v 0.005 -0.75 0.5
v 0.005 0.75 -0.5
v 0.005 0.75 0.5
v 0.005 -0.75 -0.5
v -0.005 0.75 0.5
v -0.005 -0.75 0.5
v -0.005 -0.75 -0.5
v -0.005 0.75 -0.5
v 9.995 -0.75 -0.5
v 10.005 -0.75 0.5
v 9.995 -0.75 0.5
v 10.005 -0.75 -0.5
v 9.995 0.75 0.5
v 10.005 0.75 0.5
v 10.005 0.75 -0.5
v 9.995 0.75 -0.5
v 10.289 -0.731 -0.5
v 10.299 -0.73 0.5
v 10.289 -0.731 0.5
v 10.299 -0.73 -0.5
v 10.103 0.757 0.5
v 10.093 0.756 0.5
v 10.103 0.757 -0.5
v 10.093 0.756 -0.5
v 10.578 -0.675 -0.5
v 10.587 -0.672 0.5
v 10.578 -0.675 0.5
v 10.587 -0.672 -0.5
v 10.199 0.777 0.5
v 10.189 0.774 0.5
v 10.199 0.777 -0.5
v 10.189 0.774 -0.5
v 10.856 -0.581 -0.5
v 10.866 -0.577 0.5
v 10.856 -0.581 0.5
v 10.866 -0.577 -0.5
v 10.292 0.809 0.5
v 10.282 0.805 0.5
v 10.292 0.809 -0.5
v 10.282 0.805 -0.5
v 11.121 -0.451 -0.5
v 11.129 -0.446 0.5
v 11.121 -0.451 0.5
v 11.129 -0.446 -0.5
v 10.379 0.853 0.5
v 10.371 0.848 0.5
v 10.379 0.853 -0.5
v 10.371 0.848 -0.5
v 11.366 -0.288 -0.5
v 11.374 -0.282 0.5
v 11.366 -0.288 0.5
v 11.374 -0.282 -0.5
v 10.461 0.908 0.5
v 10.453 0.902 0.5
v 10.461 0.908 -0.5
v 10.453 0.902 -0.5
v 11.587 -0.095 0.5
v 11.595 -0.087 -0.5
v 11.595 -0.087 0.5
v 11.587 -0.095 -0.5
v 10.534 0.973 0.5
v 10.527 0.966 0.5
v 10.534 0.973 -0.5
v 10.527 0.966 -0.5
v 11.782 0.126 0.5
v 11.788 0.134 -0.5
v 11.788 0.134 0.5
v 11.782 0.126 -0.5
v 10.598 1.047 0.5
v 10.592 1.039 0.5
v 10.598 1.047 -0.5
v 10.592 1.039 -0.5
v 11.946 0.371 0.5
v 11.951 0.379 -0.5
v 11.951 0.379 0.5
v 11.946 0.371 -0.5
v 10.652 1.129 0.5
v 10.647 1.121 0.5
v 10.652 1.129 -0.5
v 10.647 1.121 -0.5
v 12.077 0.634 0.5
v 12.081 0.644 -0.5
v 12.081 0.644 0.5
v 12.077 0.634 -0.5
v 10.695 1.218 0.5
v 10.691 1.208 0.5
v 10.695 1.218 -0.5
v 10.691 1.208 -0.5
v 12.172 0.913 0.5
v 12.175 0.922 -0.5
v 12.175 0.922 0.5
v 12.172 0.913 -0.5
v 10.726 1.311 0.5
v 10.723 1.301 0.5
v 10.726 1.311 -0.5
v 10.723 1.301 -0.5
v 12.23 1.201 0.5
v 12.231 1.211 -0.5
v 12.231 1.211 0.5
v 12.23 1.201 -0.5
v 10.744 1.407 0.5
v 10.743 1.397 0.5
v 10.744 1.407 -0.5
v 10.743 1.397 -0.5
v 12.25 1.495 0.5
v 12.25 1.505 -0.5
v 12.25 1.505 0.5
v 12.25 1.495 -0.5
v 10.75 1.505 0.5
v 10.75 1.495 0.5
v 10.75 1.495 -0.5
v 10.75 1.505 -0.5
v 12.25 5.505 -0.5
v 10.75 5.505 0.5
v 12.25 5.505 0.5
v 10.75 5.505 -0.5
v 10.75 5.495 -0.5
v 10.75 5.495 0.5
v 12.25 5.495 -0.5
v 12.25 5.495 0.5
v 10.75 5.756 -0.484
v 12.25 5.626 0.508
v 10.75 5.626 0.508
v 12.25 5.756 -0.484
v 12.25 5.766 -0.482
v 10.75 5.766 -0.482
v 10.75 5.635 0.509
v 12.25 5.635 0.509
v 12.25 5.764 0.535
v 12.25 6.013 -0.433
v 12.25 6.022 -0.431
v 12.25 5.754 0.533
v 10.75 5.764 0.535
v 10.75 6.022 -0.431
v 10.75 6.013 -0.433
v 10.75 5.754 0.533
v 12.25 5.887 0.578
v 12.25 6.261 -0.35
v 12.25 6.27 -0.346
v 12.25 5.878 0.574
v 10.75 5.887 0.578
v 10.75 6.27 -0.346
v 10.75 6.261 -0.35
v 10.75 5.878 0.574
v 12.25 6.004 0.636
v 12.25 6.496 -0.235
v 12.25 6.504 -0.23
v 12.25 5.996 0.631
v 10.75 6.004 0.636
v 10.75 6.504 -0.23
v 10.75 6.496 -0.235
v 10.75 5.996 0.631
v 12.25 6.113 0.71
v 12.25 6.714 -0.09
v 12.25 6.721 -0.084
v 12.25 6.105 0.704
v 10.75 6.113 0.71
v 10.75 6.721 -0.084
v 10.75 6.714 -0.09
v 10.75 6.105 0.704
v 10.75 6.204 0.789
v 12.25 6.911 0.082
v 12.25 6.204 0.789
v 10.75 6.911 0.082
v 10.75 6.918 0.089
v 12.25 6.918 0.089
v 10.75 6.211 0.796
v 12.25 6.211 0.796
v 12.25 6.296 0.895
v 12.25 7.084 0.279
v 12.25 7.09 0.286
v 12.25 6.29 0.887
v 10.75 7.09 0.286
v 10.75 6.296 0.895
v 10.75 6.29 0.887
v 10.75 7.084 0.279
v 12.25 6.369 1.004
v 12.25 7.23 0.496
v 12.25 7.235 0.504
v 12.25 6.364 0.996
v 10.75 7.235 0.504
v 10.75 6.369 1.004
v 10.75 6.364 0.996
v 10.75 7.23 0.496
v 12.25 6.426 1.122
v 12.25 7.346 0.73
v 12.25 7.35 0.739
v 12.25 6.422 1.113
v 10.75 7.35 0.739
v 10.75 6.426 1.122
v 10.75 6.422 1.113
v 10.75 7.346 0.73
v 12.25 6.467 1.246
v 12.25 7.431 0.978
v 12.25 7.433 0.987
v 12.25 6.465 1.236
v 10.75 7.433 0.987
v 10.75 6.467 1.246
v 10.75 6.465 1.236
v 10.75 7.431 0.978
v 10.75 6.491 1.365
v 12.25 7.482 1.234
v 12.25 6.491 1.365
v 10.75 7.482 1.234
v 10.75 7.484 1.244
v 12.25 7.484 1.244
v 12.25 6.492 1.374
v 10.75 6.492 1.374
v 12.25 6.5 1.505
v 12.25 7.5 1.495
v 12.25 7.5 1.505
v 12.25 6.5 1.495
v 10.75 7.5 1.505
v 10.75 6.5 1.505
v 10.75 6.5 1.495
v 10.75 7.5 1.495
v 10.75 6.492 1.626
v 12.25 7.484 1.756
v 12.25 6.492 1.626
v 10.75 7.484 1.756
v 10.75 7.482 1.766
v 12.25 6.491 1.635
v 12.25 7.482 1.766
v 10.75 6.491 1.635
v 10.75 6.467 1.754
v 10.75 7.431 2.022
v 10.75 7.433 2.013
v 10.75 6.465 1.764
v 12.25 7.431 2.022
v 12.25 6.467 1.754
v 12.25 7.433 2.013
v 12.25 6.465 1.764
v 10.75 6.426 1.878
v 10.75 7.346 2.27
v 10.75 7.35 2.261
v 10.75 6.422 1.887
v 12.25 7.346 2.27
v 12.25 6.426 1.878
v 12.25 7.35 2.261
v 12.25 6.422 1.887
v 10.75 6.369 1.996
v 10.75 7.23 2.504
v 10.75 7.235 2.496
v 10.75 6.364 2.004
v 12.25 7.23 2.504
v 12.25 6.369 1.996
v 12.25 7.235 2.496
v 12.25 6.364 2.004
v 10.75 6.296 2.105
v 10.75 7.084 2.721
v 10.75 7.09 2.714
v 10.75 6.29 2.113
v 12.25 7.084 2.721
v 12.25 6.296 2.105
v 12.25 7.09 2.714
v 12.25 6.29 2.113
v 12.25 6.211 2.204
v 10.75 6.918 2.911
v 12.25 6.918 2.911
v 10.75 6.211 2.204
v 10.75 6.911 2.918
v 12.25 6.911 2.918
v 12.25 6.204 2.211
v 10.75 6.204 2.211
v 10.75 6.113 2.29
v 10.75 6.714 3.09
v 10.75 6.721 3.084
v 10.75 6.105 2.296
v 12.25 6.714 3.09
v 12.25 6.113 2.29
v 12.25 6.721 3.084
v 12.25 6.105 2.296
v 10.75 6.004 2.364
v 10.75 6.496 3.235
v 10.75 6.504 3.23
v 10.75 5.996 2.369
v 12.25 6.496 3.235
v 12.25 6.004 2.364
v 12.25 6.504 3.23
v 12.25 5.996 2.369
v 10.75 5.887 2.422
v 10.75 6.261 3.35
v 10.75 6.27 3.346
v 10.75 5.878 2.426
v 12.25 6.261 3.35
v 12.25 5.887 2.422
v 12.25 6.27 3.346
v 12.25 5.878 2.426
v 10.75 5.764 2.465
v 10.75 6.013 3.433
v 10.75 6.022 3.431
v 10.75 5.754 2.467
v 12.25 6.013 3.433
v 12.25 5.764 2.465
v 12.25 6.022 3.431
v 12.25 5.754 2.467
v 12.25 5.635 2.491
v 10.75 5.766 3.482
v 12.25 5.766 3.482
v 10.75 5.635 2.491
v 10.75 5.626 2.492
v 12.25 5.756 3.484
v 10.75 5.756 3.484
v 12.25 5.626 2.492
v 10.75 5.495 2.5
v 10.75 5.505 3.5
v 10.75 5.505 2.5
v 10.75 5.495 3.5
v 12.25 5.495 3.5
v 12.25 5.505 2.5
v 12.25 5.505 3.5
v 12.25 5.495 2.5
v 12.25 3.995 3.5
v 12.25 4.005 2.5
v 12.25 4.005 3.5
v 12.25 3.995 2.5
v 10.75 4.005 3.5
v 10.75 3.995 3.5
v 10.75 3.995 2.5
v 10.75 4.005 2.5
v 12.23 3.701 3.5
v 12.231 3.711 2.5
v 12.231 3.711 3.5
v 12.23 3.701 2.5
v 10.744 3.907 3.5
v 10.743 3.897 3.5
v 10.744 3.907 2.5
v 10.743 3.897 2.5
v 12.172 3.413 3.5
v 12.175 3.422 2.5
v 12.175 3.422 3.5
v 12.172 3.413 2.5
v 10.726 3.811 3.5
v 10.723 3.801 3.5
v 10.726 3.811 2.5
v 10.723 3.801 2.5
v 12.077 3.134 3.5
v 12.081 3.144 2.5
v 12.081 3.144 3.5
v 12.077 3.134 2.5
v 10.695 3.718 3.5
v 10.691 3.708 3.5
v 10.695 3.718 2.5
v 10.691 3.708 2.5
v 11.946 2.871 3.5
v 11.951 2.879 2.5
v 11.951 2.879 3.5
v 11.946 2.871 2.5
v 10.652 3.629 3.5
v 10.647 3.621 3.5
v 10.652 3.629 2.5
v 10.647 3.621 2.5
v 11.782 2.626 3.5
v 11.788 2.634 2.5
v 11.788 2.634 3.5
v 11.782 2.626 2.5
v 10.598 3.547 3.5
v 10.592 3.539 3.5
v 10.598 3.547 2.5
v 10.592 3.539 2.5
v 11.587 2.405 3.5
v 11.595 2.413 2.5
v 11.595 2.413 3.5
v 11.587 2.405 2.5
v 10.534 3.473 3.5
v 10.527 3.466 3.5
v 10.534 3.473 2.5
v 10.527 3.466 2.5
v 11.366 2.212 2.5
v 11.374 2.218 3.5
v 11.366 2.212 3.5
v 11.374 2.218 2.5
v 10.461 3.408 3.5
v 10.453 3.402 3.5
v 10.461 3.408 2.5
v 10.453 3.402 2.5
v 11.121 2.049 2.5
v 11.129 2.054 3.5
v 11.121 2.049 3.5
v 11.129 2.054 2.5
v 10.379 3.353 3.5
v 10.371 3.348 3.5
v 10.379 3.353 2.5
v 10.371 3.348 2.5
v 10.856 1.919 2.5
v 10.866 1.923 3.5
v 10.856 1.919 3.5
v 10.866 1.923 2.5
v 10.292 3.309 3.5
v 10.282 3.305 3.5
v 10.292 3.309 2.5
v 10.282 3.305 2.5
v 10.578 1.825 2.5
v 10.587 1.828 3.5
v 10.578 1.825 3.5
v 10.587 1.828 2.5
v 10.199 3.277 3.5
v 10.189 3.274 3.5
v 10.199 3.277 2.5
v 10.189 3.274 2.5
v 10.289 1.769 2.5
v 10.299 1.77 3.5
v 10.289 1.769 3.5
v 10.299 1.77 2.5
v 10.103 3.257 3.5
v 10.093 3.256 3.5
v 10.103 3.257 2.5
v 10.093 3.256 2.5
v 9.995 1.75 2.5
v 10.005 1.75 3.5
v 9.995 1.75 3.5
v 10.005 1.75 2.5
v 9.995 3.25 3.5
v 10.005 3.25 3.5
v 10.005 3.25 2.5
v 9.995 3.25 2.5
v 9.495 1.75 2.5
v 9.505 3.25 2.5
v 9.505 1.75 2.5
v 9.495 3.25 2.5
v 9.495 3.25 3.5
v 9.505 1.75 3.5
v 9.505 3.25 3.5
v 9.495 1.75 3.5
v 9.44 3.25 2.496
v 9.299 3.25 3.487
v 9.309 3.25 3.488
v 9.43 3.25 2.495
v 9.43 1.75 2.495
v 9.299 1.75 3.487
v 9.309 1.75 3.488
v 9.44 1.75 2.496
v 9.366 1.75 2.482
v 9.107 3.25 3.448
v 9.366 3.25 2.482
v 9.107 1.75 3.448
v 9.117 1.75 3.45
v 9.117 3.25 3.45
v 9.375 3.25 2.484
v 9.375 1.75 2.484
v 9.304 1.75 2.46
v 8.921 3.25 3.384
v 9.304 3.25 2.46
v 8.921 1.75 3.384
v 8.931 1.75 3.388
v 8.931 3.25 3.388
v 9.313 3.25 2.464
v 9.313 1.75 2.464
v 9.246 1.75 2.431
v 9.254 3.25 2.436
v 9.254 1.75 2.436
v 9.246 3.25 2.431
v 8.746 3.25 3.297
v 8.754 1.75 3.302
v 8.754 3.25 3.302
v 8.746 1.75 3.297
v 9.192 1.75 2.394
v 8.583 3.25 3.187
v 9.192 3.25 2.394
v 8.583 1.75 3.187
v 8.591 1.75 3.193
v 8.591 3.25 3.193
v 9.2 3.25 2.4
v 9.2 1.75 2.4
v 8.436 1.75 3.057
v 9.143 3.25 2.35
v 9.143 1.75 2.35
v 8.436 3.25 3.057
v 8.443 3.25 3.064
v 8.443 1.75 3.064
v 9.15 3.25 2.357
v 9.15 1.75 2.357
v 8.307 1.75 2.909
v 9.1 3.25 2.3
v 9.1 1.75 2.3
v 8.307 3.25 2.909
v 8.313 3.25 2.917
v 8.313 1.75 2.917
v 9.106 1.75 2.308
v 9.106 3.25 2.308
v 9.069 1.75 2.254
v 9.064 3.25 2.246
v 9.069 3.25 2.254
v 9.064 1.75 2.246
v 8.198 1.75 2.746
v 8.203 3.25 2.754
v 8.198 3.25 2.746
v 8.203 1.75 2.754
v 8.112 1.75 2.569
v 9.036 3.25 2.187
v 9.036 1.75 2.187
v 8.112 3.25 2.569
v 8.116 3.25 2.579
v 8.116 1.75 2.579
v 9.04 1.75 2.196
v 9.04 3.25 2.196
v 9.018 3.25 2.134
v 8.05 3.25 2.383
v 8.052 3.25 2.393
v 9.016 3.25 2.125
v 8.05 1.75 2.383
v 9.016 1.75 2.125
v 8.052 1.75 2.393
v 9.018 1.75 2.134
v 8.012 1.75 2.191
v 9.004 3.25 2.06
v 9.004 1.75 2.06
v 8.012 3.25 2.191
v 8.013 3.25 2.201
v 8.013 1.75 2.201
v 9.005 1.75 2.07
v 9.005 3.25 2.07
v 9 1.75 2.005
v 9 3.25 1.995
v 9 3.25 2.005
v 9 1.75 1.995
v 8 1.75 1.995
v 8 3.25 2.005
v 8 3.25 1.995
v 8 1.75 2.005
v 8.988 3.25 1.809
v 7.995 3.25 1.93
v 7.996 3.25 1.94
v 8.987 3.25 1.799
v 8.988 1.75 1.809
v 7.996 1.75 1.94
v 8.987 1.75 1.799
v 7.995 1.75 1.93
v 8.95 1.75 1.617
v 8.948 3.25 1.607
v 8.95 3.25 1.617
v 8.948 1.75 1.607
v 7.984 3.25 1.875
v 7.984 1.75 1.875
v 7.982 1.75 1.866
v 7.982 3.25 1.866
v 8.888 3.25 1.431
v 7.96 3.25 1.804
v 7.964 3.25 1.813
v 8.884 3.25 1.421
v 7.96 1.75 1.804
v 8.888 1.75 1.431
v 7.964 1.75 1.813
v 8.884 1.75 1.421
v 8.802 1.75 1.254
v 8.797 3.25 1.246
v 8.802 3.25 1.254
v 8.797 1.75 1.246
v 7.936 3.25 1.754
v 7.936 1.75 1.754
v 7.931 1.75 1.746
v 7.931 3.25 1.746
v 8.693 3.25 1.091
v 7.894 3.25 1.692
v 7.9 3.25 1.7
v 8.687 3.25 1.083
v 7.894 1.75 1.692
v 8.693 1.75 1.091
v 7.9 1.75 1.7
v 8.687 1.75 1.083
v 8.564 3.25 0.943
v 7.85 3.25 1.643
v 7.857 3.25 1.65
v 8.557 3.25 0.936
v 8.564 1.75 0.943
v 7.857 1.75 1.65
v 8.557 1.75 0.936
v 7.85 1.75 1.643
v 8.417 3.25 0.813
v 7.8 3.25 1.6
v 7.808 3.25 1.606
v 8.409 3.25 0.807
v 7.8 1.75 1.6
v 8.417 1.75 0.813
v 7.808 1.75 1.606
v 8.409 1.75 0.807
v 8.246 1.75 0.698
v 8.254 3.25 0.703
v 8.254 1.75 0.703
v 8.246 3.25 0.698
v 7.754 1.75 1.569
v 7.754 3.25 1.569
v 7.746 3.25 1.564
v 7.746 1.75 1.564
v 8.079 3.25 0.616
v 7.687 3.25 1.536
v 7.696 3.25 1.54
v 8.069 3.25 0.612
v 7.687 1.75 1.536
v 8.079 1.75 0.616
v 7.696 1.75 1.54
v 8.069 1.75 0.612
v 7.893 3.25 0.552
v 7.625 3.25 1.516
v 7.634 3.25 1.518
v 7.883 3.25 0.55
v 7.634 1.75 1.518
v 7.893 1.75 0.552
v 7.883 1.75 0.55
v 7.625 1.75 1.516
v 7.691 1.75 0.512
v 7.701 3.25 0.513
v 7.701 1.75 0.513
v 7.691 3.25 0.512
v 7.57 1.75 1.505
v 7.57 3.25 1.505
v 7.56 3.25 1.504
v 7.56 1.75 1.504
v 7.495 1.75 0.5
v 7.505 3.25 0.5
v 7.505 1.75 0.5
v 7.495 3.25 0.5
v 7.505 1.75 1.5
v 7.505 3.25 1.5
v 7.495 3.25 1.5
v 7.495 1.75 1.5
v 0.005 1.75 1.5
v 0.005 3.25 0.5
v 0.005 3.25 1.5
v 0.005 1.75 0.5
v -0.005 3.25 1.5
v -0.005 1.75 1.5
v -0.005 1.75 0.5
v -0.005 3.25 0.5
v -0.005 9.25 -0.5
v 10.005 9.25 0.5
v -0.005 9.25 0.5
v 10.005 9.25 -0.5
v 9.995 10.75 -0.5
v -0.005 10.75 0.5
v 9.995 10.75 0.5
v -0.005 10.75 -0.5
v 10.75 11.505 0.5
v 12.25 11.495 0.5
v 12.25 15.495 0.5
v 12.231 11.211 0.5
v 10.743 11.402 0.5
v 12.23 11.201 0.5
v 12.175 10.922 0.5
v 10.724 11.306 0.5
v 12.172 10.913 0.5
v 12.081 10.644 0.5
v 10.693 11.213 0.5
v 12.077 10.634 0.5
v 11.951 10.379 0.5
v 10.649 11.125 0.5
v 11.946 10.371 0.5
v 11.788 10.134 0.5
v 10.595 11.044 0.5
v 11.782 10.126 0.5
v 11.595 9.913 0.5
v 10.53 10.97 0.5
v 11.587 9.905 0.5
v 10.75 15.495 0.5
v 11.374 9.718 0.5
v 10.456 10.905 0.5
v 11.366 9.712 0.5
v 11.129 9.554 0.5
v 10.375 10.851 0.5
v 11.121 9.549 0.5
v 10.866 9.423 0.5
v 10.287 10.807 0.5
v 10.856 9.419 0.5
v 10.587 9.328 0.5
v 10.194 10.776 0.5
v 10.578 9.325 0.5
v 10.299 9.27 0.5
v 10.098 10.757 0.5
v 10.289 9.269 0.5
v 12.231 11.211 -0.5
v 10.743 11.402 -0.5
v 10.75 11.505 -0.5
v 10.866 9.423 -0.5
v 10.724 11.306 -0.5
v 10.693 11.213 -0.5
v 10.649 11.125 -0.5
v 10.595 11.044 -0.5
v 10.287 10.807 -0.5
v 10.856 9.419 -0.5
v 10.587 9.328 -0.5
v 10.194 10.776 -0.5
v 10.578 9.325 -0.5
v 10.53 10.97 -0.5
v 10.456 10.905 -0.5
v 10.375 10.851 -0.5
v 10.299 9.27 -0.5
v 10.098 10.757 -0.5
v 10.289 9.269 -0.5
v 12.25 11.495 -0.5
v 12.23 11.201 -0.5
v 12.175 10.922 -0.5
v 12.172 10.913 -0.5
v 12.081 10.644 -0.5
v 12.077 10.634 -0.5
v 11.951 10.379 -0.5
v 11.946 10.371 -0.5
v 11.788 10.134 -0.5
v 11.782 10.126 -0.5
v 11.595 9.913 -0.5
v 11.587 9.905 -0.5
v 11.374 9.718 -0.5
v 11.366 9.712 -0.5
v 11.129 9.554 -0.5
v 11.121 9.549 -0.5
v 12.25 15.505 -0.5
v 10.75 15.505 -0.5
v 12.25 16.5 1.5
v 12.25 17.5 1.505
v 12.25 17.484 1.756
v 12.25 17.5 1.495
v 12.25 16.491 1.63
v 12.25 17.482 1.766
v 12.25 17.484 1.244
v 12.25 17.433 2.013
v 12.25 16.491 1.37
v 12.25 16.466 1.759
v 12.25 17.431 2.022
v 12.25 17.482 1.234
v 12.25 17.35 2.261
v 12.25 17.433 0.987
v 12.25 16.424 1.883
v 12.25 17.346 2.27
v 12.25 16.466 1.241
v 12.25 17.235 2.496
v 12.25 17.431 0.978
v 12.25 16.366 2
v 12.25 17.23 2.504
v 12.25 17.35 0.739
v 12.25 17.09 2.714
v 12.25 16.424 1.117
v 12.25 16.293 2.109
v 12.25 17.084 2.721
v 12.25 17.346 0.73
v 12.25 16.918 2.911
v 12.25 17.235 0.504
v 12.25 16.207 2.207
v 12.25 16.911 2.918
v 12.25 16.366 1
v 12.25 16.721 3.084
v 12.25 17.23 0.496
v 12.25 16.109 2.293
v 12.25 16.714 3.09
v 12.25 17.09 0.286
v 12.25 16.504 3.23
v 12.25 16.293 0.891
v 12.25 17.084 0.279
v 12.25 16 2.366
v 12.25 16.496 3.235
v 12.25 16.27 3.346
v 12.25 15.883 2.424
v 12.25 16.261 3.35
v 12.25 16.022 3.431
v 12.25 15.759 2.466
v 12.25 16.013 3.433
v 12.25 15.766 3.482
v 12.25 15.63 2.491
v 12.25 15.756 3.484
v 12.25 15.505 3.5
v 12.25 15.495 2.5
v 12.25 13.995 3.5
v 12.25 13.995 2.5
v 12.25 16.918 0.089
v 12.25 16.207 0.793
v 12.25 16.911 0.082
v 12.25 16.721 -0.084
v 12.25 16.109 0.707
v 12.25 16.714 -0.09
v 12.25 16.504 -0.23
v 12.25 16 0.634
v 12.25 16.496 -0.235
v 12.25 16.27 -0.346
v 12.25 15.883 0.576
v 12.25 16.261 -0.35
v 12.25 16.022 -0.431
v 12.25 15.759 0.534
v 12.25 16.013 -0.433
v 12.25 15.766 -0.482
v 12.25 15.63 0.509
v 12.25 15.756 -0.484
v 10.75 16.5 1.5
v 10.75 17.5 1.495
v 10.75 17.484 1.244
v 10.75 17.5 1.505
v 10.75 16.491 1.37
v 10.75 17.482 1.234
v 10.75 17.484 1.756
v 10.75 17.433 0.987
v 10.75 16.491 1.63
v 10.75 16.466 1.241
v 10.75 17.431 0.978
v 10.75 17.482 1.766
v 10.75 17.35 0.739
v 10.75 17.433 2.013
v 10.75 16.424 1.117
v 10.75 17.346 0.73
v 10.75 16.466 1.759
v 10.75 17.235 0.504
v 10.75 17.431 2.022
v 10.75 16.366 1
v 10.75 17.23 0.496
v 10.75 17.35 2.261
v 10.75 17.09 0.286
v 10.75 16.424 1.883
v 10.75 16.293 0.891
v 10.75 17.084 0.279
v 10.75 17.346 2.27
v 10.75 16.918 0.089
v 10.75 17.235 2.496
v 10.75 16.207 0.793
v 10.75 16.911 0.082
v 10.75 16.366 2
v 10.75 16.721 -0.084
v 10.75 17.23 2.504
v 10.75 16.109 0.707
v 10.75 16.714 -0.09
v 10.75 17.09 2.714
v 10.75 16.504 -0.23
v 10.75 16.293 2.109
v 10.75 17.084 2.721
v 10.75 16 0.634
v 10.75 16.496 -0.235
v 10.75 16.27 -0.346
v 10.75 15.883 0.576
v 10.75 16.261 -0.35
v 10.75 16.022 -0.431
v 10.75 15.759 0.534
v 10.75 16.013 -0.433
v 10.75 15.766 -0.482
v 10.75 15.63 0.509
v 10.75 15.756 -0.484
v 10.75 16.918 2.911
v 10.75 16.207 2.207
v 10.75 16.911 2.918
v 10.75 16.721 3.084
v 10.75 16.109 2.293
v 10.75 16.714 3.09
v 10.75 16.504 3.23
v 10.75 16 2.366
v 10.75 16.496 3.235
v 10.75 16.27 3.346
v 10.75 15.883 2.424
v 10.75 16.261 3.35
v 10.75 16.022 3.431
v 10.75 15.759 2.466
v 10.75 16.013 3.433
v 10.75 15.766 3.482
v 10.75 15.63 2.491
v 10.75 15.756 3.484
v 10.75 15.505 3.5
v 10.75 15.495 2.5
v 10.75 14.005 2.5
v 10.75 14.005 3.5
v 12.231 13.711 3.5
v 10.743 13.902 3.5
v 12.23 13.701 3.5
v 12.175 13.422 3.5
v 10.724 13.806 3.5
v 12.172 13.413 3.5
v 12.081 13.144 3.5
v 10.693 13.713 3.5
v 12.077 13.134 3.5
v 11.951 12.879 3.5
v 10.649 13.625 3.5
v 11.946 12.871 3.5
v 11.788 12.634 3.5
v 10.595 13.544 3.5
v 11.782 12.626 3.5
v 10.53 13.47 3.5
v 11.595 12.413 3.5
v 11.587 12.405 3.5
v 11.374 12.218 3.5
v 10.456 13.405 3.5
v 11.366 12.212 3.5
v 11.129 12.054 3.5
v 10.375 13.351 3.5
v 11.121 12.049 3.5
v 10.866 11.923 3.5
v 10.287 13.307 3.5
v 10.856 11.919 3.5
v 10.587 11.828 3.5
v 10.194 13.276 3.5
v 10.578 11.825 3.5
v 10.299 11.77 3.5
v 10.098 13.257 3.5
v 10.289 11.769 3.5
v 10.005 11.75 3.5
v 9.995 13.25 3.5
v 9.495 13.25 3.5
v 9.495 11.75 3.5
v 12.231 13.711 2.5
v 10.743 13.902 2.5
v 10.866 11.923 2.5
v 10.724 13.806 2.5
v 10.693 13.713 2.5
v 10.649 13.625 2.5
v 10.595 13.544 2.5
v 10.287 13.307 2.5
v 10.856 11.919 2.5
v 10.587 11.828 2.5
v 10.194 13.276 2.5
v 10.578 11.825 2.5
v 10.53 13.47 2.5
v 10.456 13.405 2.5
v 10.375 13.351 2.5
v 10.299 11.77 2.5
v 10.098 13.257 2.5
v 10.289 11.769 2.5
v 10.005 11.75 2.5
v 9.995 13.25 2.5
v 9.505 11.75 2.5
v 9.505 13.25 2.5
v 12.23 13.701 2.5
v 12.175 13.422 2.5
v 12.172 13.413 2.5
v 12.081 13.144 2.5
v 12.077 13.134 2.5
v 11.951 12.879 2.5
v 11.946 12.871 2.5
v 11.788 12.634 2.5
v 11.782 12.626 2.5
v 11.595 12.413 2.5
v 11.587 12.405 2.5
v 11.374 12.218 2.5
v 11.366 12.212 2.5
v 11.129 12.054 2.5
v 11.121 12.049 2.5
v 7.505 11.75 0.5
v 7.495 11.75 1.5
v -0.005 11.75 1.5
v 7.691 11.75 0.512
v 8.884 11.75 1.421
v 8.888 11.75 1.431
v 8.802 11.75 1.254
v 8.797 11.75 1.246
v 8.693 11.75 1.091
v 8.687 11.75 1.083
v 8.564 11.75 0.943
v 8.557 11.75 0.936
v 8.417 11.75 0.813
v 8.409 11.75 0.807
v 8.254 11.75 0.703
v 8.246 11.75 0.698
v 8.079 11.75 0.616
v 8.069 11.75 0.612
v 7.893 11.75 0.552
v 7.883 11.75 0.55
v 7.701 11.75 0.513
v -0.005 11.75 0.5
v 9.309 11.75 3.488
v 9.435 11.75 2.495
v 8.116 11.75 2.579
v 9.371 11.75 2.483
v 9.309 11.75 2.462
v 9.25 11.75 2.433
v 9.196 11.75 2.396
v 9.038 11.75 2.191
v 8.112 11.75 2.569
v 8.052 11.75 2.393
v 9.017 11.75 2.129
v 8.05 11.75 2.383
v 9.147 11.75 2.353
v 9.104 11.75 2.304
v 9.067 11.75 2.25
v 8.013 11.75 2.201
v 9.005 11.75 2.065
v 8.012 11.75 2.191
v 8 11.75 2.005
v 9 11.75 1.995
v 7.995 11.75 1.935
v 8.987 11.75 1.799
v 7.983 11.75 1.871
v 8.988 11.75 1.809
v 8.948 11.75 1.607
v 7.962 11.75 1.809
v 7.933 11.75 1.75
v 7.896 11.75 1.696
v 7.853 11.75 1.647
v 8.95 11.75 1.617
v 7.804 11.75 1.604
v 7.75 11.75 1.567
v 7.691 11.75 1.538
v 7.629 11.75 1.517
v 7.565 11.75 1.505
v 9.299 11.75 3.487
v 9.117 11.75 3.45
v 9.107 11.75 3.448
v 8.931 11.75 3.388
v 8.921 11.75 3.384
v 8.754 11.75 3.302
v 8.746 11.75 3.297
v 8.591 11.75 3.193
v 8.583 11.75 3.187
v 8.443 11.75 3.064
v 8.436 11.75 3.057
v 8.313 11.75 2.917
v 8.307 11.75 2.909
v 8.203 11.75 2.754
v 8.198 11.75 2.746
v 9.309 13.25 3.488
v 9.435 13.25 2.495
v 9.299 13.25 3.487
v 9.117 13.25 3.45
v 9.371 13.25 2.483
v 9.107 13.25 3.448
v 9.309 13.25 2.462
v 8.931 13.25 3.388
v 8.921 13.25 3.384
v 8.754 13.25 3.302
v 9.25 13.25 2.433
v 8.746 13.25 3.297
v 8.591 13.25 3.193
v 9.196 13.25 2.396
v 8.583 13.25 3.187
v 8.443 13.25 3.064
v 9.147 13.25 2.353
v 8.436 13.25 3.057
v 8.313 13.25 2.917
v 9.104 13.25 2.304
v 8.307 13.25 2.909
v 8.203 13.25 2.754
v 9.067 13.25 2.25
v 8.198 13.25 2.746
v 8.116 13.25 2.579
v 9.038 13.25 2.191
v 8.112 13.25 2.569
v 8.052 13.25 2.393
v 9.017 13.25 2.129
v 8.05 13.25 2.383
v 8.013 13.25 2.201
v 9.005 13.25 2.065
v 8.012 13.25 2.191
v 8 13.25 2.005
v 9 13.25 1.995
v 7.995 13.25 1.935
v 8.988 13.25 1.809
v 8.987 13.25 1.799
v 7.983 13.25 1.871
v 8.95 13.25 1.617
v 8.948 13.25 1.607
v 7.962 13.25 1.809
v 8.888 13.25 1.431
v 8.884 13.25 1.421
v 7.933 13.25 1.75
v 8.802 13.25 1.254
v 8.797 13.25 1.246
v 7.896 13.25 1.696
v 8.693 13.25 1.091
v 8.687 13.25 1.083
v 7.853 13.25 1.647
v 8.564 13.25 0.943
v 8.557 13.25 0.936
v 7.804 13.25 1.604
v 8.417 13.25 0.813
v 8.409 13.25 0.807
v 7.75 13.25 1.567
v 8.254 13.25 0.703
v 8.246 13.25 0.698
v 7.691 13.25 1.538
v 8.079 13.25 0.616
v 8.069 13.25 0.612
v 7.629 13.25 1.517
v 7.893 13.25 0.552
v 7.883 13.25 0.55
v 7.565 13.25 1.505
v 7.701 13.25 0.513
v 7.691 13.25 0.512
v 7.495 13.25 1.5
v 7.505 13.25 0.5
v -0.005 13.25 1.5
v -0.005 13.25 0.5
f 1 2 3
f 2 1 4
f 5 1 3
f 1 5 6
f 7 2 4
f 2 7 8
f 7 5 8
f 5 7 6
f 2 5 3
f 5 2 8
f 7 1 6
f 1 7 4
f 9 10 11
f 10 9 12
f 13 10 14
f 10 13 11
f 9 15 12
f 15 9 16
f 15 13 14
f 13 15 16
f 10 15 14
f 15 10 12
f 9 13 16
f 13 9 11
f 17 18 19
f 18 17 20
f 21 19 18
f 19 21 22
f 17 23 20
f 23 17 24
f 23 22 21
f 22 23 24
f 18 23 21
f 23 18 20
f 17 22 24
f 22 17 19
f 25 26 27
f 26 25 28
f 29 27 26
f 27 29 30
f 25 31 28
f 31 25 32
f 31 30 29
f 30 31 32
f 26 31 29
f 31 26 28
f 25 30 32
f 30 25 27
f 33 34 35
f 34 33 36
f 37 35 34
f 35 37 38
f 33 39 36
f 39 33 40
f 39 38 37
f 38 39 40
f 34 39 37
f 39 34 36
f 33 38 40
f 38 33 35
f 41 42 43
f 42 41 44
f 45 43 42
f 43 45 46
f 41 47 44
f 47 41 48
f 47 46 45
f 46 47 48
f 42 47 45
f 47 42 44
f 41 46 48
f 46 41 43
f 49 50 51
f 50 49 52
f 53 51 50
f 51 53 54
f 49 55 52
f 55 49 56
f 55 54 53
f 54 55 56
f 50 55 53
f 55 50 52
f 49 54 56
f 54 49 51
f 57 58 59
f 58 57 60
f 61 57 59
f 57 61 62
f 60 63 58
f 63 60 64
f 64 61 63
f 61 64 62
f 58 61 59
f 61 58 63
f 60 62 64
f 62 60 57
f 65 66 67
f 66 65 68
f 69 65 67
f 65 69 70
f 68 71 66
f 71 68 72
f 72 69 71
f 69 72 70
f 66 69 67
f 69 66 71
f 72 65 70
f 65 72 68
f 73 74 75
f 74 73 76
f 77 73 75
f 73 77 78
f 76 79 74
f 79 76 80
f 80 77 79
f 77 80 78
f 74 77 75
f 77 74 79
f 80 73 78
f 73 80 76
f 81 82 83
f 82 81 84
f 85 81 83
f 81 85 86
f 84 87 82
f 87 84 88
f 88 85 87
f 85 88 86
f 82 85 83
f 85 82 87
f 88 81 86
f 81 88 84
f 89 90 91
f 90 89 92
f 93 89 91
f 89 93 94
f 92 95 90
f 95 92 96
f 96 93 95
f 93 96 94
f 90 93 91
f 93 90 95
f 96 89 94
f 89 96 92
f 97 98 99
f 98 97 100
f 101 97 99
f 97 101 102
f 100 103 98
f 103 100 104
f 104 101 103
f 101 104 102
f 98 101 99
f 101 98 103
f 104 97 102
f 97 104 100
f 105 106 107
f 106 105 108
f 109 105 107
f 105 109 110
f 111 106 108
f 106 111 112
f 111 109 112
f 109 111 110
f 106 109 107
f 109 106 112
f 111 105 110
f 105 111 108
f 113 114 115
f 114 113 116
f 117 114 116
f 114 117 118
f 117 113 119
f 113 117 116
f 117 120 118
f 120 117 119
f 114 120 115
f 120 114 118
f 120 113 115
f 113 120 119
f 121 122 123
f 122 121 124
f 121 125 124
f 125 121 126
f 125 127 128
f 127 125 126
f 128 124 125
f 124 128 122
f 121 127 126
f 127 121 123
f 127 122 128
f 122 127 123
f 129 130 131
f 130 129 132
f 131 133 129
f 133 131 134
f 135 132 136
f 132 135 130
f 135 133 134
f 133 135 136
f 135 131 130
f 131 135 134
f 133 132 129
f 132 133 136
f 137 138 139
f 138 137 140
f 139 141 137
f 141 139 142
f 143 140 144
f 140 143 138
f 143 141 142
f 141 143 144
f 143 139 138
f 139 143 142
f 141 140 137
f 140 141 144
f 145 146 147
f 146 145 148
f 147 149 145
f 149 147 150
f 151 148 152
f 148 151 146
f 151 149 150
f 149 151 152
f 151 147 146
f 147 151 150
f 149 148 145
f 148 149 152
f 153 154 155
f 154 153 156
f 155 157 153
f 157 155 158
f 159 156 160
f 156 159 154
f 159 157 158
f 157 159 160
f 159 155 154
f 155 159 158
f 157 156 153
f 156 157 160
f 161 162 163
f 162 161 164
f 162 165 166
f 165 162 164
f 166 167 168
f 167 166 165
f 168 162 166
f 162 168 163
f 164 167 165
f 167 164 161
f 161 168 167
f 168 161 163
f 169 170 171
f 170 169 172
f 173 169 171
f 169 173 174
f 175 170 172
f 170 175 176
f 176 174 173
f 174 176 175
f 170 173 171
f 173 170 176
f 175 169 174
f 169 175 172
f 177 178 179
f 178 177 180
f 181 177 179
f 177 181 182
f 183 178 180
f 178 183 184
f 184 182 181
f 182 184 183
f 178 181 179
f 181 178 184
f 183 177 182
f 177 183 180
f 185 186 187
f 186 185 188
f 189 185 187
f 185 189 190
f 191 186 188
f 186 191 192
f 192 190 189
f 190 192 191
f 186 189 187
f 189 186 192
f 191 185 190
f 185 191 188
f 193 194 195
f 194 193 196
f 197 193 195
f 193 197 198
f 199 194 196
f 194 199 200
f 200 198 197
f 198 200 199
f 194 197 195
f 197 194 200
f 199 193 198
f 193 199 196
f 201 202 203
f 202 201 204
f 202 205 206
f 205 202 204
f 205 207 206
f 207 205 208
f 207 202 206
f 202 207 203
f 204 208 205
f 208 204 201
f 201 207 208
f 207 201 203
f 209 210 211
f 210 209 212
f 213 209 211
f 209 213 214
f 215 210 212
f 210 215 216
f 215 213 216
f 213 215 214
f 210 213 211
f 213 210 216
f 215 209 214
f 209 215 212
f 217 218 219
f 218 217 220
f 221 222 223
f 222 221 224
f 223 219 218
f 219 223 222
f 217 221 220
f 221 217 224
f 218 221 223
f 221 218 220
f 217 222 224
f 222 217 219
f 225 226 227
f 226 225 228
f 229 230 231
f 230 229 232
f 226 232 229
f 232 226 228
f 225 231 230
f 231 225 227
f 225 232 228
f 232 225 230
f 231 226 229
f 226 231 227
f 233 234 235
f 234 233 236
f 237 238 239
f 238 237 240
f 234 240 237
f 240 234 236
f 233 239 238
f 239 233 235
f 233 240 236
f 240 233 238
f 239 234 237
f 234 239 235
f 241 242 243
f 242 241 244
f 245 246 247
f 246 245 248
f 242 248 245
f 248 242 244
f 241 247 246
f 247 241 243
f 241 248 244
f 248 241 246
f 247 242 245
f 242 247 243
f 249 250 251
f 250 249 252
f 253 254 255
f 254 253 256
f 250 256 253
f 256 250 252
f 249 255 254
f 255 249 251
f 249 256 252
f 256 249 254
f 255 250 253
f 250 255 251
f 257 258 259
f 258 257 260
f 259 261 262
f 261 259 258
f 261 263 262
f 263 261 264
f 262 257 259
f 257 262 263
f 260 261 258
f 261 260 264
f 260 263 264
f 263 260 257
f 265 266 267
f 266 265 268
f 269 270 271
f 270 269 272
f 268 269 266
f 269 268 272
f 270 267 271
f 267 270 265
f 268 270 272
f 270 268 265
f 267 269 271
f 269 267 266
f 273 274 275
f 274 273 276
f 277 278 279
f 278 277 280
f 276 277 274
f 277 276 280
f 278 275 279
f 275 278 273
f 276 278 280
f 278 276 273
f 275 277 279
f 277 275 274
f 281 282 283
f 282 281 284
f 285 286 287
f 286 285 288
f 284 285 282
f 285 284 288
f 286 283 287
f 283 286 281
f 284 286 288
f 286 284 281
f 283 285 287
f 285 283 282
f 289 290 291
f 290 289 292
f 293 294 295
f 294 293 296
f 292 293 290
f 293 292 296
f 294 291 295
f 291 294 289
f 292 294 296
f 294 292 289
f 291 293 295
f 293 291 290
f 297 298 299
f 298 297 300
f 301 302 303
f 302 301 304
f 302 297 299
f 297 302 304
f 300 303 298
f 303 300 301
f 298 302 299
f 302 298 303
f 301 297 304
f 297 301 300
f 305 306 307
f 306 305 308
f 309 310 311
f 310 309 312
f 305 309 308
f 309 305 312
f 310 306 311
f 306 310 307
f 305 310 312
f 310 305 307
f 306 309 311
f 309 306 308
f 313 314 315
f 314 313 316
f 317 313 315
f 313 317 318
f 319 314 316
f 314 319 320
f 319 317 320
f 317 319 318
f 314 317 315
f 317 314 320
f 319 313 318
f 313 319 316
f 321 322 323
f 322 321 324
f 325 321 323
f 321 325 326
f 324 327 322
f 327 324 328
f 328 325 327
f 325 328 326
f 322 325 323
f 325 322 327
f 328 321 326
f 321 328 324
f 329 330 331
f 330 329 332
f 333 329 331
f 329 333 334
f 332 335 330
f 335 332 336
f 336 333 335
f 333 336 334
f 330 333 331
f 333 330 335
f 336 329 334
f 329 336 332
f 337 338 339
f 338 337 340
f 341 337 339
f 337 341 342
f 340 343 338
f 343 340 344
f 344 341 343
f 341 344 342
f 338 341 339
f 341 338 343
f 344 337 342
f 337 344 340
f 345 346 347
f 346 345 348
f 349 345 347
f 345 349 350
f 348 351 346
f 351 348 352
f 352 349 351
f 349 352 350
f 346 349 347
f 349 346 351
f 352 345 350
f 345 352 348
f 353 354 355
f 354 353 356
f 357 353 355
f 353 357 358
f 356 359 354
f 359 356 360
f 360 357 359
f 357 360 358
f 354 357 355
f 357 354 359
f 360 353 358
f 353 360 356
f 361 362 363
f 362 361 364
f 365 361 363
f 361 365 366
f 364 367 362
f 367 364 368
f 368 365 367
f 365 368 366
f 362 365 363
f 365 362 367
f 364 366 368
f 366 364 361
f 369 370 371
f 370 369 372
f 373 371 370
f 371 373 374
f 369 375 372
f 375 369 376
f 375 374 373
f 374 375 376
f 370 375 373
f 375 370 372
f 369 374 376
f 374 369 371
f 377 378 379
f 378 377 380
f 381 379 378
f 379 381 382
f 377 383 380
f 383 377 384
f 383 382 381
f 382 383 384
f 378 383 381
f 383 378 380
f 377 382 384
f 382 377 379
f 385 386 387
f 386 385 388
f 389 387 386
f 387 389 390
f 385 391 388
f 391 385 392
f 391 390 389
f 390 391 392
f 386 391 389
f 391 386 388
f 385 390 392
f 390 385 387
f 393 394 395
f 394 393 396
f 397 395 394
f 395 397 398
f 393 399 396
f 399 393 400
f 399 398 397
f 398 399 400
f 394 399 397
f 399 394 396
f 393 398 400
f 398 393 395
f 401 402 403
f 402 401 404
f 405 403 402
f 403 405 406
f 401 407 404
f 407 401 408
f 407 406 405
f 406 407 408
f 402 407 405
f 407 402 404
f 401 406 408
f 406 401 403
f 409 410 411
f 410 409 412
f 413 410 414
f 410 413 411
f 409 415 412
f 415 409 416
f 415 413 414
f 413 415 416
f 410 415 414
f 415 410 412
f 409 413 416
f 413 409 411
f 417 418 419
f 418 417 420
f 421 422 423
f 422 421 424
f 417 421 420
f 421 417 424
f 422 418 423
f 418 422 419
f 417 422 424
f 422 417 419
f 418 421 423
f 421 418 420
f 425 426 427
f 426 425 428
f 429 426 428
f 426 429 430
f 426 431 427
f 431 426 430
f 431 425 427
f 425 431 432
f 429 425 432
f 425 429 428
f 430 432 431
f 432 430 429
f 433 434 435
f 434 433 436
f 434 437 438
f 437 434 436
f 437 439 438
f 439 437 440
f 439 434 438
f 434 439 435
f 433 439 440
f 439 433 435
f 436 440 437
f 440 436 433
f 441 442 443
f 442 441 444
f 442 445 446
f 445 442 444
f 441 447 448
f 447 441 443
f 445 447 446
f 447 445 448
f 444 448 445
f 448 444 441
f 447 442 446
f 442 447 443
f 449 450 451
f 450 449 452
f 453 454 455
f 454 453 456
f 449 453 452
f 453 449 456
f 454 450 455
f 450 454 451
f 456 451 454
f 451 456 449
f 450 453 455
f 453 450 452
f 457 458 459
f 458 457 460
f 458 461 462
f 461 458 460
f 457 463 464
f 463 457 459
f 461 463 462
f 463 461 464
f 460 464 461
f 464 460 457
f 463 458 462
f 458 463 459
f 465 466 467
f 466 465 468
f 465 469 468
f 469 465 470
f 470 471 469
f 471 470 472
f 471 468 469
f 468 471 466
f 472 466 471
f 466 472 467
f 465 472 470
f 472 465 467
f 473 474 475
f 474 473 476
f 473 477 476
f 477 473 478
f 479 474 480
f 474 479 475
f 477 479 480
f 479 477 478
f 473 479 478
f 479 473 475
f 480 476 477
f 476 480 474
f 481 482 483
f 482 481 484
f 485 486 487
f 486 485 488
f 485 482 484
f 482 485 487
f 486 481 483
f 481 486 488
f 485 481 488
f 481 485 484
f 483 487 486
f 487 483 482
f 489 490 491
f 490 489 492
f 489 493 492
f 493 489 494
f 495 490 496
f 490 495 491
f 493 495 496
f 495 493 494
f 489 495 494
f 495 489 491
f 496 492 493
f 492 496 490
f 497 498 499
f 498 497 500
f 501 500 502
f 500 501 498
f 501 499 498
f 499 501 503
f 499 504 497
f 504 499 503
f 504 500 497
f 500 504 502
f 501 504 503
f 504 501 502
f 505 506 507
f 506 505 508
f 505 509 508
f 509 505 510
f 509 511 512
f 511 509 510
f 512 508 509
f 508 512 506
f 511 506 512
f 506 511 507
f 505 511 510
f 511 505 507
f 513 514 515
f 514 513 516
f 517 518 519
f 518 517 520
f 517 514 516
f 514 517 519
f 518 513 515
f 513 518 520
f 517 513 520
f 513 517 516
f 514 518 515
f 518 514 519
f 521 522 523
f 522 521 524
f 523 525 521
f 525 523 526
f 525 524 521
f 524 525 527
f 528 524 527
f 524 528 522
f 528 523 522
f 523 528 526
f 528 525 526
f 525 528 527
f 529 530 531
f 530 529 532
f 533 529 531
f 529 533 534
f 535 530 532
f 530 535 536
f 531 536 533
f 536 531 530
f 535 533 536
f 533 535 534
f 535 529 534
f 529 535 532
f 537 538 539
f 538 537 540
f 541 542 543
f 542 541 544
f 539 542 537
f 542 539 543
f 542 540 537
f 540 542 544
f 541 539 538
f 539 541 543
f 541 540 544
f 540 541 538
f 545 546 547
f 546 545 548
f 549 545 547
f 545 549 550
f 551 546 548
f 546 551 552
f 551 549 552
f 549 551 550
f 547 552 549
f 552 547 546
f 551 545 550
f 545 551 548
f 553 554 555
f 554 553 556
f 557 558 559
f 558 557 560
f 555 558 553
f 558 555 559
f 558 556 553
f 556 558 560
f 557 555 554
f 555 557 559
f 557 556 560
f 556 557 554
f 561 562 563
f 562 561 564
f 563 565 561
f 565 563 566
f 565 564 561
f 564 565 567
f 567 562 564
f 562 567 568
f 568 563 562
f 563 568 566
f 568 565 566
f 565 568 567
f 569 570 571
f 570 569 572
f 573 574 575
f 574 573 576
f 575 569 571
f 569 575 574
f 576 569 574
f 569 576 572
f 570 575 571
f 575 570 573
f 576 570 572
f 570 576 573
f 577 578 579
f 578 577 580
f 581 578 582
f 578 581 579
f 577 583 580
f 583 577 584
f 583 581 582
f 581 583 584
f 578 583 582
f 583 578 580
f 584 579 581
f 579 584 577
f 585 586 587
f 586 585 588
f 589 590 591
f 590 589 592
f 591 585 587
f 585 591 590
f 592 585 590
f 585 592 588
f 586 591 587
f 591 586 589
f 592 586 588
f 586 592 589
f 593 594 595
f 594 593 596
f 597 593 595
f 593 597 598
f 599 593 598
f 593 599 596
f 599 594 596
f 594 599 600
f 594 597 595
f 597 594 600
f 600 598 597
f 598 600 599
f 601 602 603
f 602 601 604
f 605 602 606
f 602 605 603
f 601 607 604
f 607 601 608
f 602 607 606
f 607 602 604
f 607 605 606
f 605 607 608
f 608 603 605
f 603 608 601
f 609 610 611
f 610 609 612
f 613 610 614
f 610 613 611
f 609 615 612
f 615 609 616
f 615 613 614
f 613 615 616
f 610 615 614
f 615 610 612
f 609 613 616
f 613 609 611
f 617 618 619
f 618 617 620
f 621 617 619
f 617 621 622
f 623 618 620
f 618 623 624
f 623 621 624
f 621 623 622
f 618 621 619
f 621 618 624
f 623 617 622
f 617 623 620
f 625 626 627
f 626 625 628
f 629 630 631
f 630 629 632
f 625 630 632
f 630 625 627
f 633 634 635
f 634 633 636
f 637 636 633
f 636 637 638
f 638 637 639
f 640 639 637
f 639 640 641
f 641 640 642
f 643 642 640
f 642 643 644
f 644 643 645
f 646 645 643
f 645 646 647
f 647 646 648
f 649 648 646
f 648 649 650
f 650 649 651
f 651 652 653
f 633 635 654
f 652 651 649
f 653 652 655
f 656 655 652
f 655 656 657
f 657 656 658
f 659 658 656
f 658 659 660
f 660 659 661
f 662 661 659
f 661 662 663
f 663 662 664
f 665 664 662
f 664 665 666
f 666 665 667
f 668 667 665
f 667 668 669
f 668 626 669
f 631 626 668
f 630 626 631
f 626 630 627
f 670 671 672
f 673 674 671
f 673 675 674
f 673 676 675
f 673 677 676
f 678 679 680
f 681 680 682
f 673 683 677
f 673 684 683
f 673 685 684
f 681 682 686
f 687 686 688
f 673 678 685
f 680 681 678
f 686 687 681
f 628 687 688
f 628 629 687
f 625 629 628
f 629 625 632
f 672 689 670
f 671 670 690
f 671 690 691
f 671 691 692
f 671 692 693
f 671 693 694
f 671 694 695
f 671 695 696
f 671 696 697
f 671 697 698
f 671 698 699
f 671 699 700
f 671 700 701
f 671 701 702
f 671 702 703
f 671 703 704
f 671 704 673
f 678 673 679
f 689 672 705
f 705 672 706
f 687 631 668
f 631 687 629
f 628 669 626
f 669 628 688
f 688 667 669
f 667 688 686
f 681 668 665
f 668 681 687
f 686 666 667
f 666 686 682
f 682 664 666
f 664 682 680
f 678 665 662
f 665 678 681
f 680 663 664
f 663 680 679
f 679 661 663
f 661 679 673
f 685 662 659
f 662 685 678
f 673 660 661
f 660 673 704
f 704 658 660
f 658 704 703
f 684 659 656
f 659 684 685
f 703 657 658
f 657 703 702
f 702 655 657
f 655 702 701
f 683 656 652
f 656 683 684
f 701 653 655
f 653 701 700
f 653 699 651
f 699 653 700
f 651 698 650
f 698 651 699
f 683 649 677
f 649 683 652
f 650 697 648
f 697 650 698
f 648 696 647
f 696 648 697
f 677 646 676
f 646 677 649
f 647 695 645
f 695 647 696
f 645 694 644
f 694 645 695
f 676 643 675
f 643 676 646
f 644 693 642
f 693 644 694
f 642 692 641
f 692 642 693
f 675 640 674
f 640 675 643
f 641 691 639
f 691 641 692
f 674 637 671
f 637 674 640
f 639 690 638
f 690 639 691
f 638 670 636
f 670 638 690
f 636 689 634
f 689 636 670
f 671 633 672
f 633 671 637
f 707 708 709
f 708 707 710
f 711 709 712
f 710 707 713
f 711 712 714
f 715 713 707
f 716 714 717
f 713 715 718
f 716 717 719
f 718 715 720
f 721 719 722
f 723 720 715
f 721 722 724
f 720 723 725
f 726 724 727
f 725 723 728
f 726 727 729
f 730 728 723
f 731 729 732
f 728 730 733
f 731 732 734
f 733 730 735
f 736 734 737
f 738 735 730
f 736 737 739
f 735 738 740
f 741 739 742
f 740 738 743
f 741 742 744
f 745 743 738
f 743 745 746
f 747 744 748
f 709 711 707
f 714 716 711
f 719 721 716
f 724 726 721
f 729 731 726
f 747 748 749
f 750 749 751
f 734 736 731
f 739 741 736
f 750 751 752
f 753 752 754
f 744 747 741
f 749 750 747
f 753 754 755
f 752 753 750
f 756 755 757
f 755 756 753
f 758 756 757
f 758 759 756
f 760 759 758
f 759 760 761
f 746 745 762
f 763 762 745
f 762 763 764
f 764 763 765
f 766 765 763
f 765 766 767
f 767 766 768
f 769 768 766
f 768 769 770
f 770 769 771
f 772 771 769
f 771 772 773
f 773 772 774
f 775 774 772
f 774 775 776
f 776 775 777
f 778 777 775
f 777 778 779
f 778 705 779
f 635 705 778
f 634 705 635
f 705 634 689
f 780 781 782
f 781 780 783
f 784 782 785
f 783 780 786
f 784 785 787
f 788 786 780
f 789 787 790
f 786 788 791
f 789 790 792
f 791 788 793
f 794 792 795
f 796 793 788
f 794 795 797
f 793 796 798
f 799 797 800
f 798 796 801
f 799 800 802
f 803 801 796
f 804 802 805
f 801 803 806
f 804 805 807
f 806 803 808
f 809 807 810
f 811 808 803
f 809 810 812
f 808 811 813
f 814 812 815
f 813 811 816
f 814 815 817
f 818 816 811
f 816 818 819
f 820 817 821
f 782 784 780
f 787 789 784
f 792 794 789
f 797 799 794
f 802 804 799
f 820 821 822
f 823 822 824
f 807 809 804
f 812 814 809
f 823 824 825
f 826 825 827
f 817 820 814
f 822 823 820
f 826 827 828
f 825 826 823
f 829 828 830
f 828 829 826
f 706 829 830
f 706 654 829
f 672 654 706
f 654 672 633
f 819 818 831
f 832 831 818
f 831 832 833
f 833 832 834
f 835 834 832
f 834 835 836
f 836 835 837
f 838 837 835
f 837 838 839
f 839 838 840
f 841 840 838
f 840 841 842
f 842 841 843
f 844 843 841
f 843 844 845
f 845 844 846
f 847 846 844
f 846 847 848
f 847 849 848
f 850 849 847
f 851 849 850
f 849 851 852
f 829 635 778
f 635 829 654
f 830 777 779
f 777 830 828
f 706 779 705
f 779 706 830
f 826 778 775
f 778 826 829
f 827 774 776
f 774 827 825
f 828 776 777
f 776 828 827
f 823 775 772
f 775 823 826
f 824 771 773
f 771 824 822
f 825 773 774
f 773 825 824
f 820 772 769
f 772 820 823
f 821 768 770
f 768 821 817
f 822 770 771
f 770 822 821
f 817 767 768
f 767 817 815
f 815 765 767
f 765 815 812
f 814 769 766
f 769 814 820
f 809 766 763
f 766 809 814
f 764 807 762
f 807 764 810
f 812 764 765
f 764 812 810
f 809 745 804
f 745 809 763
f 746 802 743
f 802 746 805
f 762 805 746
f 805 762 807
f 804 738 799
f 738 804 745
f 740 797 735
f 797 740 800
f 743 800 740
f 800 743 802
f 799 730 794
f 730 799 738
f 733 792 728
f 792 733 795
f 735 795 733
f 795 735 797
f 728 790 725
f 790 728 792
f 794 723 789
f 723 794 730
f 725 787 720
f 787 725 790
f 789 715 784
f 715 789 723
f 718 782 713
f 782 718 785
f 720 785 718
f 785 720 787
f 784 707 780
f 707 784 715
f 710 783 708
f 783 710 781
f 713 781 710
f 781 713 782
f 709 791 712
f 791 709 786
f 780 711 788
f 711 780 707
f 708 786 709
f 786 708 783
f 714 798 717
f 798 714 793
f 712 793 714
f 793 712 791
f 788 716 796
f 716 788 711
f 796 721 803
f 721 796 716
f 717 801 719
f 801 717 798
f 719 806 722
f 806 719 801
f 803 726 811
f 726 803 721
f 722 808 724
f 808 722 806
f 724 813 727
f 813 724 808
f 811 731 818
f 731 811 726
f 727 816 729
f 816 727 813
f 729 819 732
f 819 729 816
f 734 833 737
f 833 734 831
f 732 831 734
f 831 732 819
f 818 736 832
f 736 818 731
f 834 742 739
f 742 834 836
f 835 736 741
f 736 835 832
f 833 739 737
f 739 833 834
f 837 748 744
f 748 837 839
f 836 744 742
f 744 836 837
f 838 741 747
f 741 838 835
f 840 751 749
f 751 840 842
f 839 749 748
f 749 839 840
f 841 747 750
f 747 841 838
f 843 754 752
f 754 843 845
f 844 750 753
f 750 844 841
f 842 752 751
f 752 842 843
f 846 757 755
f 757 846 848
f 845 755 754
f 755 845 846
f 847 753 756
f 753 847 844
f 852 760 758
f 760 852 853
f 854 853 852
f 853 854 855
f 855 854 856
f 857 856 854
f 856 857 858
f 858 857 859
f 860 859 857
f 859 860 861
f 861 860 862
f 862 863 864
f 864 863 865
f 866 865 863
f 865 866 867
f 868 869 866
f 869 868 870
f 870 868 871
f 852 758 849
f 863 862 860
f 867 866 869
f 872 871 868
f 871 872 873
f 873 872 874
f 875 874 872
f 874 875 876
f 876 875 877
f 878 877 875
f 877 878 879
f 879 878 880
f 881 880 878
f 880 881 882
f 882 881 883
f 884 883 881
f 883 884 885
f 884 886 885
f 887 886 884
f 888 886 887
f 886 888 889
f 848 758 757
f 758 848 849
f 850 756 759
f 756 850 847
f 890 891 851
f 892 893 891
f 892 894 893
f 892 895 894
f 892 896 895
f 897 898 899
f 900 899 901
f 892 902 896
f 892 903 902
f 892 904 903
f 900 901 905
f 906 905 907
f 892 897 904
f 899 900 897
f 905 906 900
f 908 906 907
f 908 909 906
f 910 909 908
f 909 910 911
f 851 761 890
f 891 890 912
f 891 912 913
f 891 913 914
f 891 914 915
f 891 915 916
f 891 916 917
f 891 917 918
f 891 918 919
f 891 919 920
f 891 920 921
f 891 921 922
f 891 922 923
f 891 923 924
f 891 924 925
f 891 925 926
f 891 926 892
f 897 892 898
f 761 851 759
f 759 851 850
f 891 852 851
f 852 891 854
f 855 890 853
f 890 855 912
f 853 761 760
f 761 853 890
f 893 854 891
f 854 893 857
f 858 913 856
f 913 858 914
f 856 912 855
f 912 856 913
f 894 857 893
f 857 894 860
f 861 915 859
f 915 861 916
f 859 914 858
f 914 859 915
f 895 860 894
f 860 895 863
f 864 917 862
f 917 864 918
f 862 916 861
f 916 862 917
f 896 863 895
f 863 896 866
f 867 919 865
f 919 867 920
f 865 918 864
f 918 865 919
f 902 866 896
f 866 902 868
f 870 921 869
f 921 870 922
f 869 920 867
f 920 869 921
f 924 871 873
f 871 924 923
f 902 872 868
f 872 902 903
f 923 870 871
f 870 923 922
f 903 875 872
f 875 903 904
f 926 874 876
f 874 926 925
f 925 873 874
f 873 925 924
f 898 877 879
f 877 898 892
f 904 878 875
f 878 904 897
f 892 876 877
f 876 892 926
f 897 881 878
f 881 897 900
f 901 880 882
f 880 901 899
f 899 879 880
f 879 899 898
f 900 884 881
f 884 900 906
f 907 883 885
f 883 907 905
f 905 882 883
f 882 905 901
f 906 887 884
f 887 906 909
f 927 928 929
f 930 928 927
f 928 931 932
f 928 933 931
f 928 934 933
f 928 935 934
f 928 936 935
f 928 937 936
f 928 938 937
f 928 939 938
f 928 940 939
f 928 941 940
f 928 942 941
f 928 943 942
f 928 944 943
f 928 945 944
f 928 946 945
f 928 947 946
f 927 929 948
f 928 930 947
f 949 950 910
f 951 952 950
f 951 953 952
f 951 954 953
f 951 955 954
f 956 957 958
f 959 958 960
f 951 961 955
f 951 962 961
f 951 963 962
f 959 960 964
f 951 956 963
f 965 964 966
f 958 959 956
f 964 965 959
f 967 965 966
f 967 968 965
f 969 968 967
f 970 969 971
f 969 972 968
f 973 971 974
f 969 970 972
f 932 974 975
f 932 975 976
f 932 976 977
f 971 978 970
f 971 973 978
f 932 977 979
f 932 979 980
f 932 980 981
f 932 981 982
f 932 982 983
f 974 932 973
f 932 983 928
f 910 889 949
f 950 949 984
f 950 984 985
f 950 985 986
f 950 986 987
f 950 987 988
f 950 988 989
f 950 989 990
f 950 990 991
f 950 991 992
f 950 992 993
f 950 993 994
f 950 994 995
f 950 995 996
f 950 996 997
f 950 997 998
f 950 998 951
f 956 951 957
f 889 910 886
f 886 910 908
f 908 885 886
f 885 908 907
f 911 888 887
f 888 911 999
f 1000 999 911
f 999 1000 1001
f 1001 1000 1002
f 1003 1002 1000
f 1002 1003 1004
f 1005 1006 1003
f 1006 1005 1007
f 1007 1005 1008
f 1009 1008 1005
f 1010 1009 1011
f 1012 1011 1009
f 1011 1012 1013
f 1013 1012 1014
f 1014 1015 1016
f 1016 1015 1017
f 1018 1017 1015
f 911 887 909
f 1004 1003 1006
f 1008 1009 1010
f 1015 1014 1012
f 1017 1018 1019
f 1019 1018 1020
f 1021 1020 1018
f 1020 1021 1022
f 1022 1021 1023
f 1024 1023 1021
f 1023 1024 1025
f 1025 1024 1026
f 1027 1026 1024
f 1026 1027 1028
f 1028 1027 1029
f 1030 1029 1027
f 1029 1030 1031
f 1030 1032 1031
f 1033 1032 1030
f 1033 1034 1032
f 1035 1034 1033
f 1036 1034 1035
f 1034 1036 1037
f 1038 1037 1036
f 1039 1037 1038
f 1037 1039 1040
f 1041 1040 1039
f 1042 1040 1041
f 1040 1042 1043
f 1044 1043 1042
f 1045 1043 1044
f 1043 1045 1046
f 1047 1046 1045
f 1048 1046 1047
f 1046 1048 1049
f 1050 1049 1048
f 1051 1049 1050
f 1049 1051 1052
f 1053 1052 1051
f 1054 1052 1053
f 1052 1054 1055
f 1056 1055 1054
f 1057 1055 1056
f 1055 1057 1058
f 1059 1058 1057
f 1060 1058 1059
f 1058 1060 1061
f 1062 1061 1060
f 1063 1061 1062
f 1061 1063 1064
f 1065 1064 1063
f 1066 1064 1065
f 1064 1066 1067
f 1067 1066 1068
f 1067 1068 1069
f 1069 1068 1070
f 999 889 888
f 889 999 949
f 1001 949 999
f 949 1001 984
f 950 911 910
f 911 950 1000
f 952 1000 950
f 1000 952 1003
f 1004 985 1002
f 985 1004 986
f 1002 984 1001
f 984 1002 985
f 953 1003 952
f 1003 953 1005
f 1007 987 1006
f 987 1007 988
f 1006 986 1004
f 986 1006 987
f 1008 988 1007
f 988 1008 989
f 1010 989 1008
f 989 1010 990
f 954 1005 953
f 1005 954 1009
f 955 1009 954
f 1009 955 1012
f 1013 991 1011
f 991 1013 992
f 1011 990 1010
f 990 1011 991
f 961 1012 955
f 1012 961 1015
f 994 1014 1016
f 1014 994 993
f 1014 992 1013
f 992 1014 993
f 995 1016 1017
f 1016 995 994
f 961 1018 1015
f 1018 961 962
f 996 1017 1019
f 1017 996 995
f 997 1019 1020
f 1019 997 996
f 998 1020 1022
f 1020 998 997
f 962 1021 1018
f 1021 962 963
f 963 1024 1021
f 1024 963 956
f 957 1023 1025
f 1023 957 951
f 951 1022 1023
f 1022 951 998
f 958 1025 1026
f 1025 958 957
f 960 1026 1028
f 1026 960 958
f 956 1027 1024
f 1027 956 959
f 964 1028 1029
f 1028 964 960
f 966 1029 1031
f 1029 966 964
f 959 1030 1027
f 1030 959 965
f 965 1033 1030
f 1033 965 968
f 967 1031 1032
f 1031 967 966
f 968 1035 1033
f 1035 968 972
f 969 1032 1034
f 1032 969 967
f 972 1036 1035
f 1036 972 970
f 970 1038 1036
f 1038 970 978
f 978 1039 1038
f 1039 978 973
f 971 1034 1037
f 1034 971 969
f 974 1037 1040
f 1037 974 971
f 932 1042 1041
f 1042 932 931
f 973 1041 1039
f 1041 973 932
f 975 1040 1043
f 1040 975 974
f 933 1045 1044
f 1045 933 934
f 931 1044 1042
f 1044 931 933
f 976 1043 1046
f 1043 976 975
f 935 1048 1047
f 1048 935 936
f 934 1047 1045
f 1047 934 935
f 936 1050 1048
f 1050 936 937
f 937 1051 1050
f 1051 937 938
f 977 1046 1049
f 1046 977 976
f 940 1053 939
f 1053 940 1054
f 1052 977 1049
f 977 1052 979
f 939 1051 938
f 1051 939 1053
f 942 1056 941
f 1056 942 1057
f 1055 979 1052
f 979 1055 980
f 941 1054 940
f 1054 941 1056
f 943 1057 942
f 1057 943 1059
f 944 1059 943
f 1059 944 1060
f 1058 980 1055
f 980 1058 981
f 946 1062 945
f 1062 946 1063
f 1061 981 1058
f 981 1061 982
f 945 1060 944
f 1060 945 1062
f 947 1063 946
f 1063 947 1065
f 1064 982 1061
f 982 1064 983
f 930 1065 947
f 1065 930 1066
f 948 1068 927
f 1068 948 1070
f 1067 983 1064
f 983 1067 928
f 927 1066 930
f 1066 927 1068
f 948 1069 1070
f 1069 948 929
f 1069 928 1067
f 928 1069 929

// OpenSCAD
use <../polychannel.scad>

eps=0.01;

n_segs90 = 12;
radius = 1.5;
width = 1.5;
height = 1;
size_for_arc_xy = [width, eps, height];
size_for_arc_xz = [height, width, eps];
size_for_arc_yz = [width, height, eps];
size_yz = [eps, width, height];

params_channel_with_arcs = [
    ["cube", size_yz, [0, 0, 0], no_rot()],
    each set_first_position(arc_xy_rel_position("cube", size_for_arc_xy, radius, -90, 0, n_segs90), pos=[10, 0, 0]),
    each set_first_position(arc_yz_rel_position("cube", size_for_arc_yz, radius, -90, 90, 2*n_segs90), pos=[0, 4, 0]),
    each set_first_position(arc_xy_rel_position("cube", size_for_arc_xy, radius, 0, -90, n_segs90), pos=[0, -1.5, 0]),
    each set_first_position(arc_xz_rel_position("cube", size_for_arc_xz, radius/1.5, 90, 180, n_segs90), pos=[-0.5, 0, 0]),
    each arc_xz_rel_position("cube", size_for_arc_xz, radius/1.5, 0, -90, n_segs90),
    ["cube", size_yz, [-7.5, 0, 0], no_rot()],
];

polychannel(params_channel_with_arcs, clr="Salmon", show_only_shapes=true);
translate([0, 10, 0]) 
    polychannel(params_channel_with_arcs);

echo();
echo();
echo(get_final_position(params_channel_with_arcs));
echo();
